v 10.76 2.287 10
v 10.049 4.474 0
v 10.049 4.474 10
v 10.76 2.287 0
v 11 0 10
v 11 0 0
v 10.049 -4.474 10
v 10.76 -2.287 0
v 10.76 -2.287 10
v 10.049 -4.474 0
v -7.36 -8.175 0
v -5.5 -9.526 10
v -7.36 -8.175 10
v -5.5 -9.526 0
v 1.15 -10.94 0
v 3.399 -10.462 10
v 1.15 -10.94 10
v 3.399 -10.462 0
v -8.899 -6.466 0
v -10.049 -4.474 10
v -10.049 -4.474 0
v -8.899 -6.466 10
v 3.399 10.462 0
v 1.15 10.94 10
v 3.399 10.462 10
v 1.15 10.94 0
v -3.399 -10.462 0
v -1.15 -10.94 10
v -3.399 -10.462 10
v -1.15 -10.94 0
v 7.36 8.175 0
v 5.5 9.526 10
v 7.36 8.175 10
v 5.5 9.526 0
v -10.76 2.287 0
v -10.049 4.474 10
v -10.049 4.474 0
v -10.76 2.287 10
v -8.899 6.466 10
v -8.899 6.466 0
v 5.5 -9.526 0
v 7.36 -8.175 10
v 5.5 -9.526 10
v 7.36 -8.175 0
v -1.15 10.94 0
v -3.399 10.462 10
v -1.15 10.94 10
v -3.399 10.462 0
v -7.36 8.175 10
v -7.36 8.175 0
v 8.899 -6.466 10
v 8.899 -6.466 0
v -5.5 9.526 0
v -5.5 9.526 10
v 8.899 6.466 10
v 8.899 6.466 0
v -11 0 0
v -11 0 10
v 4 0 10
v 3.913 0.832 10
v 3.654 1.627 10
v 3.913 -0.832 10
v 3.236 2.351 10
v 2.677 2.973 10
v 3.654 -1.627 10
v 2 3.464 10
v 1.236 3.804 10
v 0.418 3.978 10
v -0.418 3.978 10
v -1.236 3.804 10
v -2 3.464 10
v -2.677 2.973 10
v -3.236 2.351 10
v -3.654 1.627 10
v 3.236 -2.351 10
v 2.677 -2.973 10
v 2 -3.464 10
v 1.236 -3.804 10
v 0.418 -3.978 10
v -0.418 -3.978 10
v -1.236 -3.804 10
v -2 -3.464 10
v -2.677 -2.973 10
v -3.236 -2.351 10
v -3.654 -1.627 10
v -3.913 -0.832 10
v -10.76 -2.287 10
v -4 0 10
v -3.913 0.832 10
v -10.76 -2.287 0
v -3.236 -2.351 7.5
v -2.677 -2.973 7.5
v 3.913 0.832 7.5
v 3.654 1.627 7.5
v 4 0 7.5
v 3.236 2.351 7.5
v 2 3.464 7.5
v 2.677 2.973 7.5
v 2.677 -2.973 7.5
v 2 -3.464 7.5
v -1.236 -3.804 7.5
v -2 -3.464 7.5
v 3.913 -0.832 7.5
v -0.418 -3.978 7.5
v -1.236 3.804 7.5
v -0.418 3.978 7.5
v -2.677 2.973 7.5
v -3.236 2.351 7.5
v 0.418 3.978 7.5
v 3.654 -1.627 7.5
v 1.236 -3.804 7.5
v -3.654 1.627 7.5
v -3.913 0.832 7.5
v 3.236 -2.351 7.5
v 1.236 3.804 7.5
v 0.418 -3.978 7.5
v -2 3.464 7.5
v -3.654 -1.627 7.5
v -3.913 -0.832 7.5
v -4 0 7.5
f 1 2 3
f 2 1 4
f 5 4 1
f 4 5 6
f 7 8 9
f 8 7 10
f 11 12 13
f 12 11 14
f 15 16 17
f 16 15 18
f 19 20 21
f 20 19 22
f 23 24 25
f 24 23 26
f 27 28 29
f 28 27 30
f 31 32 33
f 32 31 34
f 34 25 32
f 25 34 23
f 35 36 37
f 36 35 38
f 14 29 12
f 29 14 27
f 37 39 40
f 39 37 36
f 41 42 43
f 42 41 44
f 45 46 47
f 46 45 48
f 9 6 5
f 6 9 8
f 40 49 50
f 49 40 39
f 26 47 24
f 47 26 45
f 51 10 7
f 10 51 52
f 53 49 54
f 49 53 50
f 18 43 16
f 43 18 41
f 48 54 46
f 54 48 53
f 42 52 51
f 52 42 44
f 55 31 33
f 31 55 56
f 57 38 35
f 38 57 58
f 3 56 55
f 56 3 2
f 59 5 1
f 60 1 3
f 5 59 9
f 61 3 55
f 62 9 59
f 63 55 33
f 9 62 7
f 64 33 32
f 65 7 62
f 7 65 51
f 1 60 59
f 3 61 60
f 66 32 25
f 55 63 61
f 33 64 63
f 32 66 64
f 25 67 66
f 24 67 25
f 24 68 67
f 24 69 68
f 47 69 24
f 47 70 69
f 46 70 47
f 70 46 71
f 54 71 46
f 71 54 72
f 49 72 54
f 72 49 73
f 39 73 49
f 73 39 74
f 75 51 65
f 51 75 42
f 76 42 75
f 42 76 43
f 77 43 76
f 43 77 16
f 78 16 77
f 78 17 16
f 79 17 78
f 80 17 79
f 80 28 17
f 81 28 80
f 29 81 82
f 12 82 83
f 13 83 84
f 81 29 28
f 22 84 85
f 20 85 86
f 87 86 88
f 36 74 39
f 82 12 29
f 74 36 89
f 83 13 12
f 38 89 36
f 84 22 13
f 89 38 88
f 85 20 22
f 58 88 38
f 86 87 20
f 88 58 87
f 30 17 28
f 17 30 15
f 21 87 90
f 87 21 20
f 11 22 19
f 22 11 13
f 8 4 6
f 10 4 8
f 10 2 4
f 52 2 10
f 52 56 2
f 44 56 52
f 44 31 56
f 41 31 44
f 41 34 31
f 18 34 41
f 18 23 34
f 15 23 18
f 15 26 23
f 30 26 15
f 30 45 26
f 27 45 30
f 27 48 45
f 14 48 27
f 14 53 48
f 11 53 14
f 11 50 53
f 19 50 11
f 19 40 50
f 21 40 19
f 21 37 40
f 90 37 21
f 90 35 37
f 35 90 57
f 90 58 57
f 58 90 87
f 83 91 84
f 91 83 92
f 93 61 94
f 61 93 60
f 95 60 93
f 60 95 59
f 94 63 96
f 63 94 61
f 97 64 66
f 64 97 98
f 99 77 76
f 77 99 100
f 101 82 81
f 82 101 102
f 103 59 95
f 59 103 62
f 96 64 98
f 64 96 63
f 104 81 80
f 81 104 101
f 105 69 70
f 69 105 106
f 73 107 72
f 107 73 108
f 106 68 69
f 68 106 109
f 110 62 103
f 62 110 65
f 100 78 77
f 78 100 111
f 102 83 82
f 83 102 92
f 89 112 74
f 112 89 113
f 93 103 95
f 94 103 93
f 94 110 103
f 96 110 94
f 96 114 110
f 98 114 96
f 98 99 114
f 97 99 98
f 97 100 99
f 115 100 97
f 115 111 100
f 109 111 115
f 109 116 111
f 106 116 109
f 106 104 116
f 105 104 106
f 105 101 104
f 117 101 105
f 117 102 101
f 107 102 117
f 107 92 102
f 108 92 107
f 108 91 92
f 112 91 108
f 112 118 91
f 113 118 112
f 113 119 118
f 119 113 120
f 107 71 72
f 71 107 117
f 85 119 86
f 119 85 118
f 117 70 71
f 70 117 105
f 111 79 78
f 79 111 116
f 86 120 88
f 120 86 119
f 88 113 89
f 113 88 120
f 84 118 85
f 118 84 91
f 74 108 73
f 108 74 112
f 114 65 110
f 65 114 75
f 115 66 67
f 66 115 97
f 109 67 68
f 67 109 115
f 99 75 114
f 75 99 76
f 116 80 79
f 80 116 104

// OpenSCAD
// file: config.scad
// Author: Mihai Oltean, www.tcreate.org, mihai.oltean@gmail.com
// More details: jenny5.org
// Source: github.com/jenny5-robot
// MIT License
//--------------------------------------------------------------

aluminium_color = "Silver";
screw_color = "LightSlateGray";
frame_color = aluminium_color;
shaft_color = "Silver";
plastic_color = "Yellow";
pulley_color = "DarkSlateGray";
steel_color = "LightSlateGray";
// file: tolerance.scad
// Author: Mihai Oltean, https://mihaioltean.github.io, mihai.oltean@gmail.com
// More details: jenny5.org
// Source: github.com/jenny5-robot
// MIT License
//--------------------------------------------------------------

tolerance = 0.1;
display_tolerance = 1;

overlap_tolerance = 0.01;

tolerance_z = [0, 0, tolerance];
tolerance_x = [tolerance, 0, 0];
tolerance_y = [0, tolerance, 0];

display_tolerance_z = [0, 0, display_tolerance];
display_tolerance_x = [display_tolerance, 0, 0];
display_tolerance_y = [0, display_tolerance, 0];

display_tolerance_xz = [display_tolerance, 0, display_tolerance];
display_tolerance_xy = [display_tolerance, display_tolerance, 0];
display_tolerance_yz = [0, display_tolerance, display_tolerance];

display_tolerance_xyz = [display_tolerance, display_tolerance, display_tolerance];
// file: as5147_params.scad
// Author: Mihai Oltean, https://mihaioltean.github.io, mihai.oltean@gmail.com
// More details: http://jenny5.org, https://jenny5-robot.github.io/
// Source: github.com/jenny5-robot
// MIT License
//--------------------------------------------------------------

as5147_board_size = [28, 22, 2];

as5147_space_between_holes_length = 11;
as5147_space_between_holes_width = 18;
as5147_distance_hole_from_margin = 2;

as5147_holes_position = [
[as5147_distance_hole_from_margin, as5147_distance_hole_from_margin, 0],
[as5147_distance_hole_from_margin + as5147_space_between_holes_length, as5147_distance_hole_from_margin, 0],
[as5147_distance_hole_from_margin, as5147_distance_hole_from_margin + as5147_space_between_holes_width, 0],
[as5147_distance_hole_from_margin + as5147_space_between_holes_length, as5147_distance_hole_from_margin + as5147_space_between_holes_width, 0],
];

as5147_pin_area_length = 7.5;

as5147_sensor_center = [as5147_distance_hole_from_margin + as5147_space_between_holes_length / 2, as5147_space_between_holes_length + as5147_space_between_holes_width / 2];
// main file
// Author: Mihai Oltean, https://mihaioltean.github.io, mihai.oltean@gmail.com
// More details: http://jenny5.org, https://jenny5-robot.github.io/
// Source: github.com/jenny5-robot
// MIT License
//--------------------------------------------------------------

include <as5147_params.scad>
include <tolerance.scad>
include <config.scad>

//--------------------------------------------------------------
module as5147()
{
    difference(){
        union(){
            color ("green") cube(as5147_board_size);
            translate ([as5147_board_size[0] - as5147_pin_area_length, 0, as5147_board_size[2]]) color ("black") cube([23, as5147_board_size[1], 2 * 2.54]);
        }
        for (i = [0 : 3])
            translate (as5147_holes_position[i] - display_tolerance_z) cylinder (h = as5147_board_size[2] + 2 * display_tolerance, r = 1.3, $fn = 10);
    }
}
//--------------------------------------------------------------
module magnetic_holder(holder_height = 10, magnet_radius = 4, magnet_thick = 2.5, tube_internal_radius = 11)
{
    difference(){
        color (plastic_color) cylinder (h = holder_height, r = tube_internal_radius, $fn = 30);
        translate ([0, 0, holder_height - magnet_thick]) cylinder (h = magnet_thick + display_tolerance, r = magnet_radius, $fn = 30);
    }
}
//--------------------------------------------------------------
module magnet(magnet_radius = 4, magnet_thick = 2.5)
{
    color ("DarkGray") cylinder (h = magnet_thick, r = magnet_radius);
}
//--------------------------------------------------------------

module magnetic_holder_with_magnet(holder_height = 10, magnet_radius = 4, magnet_thick = 2.5, tube_internal_radius = 11)
{
    magnetic_holder(holder_height = holder_height, magnet_radius = magnet_radius, magnet_thick = magnet_thick, tube_internal_radius = tube_internal_radius);
    translate ([0, 0, holder_height - magnet_thick]) magnet(magnet_radius = magnet_radius, magnet_thick = magnet_thick);
}
//--------------------------------------------------------------

//as5147();

magnetic_holder(holder_height = 10, magnet_radius = 4, magnet_thick = 2.5, tube_internal_radius = 11);
